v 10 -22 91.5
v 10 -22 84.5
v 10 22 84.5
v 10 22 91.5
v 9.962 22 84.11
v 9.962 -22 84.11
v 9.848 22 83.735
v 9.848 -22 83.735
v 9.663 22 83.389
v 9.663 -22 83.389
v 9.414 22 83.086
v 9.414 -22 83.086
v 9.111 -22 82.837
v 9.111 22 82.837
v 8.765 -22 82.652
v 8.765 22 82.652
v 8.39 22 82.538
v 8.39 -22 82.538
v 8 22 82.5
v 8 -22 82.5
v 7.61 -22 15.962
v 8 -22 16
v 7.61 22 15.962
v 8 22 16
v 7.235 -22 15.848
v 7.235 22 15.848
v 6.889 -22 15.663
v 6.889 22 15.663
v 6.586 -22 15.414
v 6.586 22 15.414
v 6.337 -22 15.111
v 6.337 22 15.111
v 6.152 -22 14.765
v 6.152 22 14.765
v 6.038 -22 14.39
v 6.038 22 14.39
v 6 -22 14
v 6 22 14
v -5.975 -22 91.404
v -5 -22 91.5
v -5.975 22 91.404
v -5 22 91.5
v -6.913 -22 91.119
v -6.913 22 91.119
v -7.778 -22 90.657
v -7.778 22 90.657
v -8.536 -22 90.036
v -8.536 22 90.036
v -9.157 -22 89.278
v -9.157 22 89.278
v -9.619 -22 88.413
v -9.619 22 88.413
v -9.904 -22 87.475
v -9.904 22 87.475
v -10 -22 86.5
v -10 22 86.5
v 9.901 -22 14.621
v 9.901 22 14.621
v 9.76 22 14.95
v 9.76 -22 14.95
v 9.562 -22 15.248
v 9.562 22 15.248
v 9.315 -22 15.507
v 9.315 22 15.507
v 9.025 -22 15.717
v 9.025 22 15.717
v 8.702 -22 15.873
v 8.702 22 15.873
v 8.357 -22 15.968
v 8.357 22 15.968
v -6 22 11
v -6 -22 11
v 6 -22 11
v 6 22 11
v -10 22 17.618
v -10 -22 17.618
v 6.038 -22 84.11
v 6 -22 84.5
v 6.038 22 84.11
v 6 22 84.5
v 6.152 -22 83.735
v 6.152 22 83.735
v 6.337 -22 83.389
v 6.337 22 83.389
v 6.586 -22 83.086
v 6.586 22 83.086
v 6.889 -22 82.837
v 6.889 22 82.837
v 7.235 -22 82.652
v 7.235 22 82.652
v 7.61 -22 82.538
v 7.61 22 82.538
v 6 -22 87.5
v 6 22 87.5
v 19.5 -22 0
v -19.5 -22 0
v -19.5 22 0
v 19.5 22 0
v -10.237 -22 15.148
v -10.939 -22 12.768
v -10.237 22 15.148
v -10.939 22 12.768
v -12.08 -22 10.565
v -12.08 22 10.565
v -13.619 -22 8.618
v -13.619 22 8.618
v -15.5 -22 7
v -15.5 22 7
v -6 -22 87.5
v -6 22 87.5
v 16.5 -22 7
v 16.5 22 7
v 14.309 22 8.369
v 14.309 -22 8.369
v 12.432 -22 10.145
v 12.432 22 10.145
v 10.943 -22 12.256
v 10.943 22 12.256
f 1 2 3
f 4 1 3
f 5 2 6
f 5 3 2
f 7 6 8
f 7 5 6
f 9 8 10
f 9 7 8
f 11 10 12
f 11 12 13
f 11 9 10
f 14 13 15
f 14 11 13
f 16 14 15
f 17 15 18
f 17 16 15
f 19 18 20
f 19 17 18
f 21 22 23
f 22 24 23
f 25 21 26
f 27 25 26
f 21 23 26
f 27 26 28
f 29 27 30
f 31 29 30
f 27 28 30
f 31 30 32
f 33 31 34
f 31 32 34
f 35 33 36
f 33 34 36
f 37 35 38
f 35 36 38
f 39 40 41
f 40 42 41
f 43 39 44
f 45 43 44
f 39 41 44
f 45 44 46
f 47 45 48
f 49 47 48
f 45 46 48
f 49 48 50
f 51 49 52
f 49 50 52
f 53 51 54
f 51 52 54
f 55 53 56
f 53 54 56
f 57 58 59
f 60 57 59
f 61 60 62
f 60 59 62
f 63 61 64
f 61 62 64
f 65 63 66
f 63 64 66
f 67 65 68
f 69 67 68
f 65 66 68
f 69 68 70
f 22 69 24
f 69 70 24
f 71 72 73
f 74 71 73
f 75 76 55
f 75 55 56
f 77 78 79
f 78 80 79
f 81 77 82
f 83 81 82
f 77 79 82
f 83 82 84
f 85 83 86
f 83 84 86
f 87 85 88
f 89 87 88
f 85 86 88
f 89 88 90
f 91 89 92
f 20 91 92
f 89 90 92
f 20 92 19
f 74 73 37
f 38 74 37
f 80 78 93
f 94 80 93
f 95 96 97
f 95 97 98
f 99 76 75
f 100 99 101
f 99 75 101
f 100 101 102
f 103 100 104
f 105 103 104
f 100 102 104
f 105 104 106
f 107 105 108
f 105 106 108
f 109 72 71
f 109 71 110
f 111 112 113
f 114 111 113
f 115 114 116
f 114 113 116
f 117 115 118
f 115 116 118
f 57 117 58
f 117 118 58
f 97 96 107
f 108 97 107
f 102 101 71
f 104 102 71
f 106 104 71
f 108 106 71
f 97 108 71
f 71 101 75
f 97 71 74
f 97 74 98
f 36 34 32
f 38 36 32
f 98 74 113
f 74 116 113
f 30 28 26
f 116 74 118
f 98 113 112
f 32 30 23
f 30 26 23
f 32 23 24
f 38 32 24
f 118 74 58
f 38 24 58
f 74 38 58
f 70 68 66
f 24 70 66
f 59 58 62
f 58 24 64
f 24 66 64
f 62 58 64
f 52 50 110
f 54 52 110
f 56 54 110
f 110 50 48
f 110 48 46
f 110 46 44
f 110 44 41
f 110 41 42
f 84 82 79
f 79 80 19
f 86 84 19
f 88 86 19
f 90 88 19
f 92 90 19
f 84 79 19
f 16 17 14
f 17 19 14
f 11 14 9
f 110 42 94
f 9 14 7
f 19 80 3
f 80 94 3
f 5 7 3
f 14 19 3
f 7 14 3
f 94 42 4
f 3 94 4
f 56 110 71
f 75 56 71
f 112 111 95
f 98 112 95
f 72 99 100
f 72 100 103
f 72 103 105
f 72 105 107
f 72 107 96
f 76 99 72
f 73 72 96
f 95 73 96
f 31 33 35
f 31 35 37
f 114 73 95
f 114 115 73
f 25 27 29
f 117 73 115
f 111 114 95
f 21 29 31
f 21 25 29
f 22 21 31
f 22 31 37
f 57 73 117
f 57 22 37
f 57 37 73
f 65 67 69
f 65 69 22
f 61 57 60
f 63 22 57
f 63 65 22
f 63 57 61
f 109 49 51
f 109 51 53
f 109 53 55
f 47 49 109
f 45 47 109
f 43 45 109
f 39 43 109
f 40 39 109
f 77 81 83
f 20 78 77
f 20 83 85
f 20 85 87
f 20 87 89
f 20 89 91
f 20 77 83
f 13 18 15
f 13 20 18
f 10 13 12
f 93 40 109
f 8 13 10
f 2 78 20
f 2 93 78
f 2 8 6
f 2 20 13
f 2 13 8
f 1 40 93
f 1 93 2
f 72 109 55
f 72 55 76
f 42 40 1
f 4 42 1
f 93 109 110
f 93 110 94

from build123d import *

# Parameters (mm, degrees)
F0_W         = 39
F0_H         = 44
F1_DEPTH     = 7
F3_DEPTH     = 44
F4_W         = 20
F4_H         = 44
F5_DEPTH     = 5
F6_W         = 20
F6_H         = 44
F7_DEPTH     = 79.5
F8_W         = 12
F8_H         = 76.5
F9_DEPTH     = 44
F10_W        = 4
F10_H        = 66.5
F11_DEPTH    = 44
F12_R        = 1.99999
F13_T1_DEPTH = 44
F14_R        = 5


# Not quite as in the source:
# - a fillet or chamfer that OpenCascade refuses, or shapes differently, is made with other operations: its cross-section is extruded or revolved along the edge and cut away or added
# - a fillet or chamfer is up to 0.001 mm smaller than in the source, because OpenCascade refuses the exact size


with BuildPart() as f1:
    # F0 (on Top) → F1 (new body)
    with BuildSketch(Plane.XY):
        Rectangle(F0_W, F0_H)
    extrude(amount=F1_DEPTH)

    # F2 (on face) → F3 (cut)
    with BuildSketch(Plane.XZ.offset(22)):
        Polygon((-19.5, 7), (-19.5, 0), (-15.5, 7), align=None)
        Polygon((16.5, 7), (19.5, 0), (19.5, 7), align=None)
    extrude(amount=-F3_DEPTH, mode=Mode.SUBTRACT)

    # F4 (on face) → F5 (join)
    with BuildSketch(Plane.XY.offset(7)):
        Rectangle(F4_W, F4_H)
    extrude(amount=F5_DEPTH)

    # F6 (on face) → F7 (join)
    with BuildSketch(Plane.XY.offset(12)):
        Rectangle(F6_W, F6_H)
    extrude(amount=F7_DEPTH)

    # F8 (on face) → F9 (cut)
    with BuildSketch(Plane.XZ.offset(22)):
        with Locations((0, 49.25)):
            Rectangle(F8_W, F8_H)
    extrude(amount=-F9_DEPTH, mode=Mode.SUBTRACT)

    # F10 (on face) → F11 (cut)
    with BuildSketch(Plane.XZ.offset(22)):
        with Locations((8, 49.25)):
            Rectangle(F10_W, F10_H)
    extrude(amount=-F11_DEPTH, mode=Mode.SUBTRACT)

    # F12 (radius 2 in the source; OpenCascade refuses exactly that, so slightly less here)
    f12_edges = [f1.edges().sort_by_distance(p)[0] for p in [
        (10, 0, 82.5),
        (6, 0, 16),
        (10, 0, 16),
        (6, 0, 82.5),
    ]]
    fillet(f12_edges, radius=F12_R)

    # F13: fillet of radius 13 on 2 edges, made by hand

    # F13_s2 → F13_t1 (join)
    with BuildSketch(Plane.XZ.offset(-22)):
        with BuildLine():
            ThreePointArc((16.5, 7), (12.4319250008, 10.1446687277), (9.9012785359, 14.6206048393))
            Line((9.9012785359, 14.6206048393), (8.6654478084, 14.2172161768))
            ThreePointArc((8.6654478084, 14.2172161768), (8.7, 14.00001), (8.7, 7))
            Line((8.7, 7), (10, 5.7))
            ThreePointArc((10, 5.7), (13.25, 5.7), (15.9240414189, 5.8345508536))
            Line((15.9240414189, 5.8345508536), (16.5, 7))
        make_face()
        with BuildLine():
            ThreePointArc((-10, 17.6183802908), (-11.4566036194, 11.6392499192), (-15.5, 7))
            Line((-15.5, 7), (-15.35, 6.7876323942))
            ThreePointArc((-15.35, 6.7876323942), (-12.75, 6.74), (-10, 6.74))
            Line((-10, 6.74), (-9.74, 7))
            Line((-9.74, 7), (-9.74, 17.6183802908))
            Line((-9.74, 17.6183802908), (-10, 17.6183802908))
        make_face()
    extrude(amount=F13_T1_DEPTH)

    # F14
    f14_edges = [f1.edges().sort_by_distance(p)[0] for p in [
        (-10, 0, 91.5),
    ]]
    fillet(f14_edges, radius=F14_R)


solid = f1.part
